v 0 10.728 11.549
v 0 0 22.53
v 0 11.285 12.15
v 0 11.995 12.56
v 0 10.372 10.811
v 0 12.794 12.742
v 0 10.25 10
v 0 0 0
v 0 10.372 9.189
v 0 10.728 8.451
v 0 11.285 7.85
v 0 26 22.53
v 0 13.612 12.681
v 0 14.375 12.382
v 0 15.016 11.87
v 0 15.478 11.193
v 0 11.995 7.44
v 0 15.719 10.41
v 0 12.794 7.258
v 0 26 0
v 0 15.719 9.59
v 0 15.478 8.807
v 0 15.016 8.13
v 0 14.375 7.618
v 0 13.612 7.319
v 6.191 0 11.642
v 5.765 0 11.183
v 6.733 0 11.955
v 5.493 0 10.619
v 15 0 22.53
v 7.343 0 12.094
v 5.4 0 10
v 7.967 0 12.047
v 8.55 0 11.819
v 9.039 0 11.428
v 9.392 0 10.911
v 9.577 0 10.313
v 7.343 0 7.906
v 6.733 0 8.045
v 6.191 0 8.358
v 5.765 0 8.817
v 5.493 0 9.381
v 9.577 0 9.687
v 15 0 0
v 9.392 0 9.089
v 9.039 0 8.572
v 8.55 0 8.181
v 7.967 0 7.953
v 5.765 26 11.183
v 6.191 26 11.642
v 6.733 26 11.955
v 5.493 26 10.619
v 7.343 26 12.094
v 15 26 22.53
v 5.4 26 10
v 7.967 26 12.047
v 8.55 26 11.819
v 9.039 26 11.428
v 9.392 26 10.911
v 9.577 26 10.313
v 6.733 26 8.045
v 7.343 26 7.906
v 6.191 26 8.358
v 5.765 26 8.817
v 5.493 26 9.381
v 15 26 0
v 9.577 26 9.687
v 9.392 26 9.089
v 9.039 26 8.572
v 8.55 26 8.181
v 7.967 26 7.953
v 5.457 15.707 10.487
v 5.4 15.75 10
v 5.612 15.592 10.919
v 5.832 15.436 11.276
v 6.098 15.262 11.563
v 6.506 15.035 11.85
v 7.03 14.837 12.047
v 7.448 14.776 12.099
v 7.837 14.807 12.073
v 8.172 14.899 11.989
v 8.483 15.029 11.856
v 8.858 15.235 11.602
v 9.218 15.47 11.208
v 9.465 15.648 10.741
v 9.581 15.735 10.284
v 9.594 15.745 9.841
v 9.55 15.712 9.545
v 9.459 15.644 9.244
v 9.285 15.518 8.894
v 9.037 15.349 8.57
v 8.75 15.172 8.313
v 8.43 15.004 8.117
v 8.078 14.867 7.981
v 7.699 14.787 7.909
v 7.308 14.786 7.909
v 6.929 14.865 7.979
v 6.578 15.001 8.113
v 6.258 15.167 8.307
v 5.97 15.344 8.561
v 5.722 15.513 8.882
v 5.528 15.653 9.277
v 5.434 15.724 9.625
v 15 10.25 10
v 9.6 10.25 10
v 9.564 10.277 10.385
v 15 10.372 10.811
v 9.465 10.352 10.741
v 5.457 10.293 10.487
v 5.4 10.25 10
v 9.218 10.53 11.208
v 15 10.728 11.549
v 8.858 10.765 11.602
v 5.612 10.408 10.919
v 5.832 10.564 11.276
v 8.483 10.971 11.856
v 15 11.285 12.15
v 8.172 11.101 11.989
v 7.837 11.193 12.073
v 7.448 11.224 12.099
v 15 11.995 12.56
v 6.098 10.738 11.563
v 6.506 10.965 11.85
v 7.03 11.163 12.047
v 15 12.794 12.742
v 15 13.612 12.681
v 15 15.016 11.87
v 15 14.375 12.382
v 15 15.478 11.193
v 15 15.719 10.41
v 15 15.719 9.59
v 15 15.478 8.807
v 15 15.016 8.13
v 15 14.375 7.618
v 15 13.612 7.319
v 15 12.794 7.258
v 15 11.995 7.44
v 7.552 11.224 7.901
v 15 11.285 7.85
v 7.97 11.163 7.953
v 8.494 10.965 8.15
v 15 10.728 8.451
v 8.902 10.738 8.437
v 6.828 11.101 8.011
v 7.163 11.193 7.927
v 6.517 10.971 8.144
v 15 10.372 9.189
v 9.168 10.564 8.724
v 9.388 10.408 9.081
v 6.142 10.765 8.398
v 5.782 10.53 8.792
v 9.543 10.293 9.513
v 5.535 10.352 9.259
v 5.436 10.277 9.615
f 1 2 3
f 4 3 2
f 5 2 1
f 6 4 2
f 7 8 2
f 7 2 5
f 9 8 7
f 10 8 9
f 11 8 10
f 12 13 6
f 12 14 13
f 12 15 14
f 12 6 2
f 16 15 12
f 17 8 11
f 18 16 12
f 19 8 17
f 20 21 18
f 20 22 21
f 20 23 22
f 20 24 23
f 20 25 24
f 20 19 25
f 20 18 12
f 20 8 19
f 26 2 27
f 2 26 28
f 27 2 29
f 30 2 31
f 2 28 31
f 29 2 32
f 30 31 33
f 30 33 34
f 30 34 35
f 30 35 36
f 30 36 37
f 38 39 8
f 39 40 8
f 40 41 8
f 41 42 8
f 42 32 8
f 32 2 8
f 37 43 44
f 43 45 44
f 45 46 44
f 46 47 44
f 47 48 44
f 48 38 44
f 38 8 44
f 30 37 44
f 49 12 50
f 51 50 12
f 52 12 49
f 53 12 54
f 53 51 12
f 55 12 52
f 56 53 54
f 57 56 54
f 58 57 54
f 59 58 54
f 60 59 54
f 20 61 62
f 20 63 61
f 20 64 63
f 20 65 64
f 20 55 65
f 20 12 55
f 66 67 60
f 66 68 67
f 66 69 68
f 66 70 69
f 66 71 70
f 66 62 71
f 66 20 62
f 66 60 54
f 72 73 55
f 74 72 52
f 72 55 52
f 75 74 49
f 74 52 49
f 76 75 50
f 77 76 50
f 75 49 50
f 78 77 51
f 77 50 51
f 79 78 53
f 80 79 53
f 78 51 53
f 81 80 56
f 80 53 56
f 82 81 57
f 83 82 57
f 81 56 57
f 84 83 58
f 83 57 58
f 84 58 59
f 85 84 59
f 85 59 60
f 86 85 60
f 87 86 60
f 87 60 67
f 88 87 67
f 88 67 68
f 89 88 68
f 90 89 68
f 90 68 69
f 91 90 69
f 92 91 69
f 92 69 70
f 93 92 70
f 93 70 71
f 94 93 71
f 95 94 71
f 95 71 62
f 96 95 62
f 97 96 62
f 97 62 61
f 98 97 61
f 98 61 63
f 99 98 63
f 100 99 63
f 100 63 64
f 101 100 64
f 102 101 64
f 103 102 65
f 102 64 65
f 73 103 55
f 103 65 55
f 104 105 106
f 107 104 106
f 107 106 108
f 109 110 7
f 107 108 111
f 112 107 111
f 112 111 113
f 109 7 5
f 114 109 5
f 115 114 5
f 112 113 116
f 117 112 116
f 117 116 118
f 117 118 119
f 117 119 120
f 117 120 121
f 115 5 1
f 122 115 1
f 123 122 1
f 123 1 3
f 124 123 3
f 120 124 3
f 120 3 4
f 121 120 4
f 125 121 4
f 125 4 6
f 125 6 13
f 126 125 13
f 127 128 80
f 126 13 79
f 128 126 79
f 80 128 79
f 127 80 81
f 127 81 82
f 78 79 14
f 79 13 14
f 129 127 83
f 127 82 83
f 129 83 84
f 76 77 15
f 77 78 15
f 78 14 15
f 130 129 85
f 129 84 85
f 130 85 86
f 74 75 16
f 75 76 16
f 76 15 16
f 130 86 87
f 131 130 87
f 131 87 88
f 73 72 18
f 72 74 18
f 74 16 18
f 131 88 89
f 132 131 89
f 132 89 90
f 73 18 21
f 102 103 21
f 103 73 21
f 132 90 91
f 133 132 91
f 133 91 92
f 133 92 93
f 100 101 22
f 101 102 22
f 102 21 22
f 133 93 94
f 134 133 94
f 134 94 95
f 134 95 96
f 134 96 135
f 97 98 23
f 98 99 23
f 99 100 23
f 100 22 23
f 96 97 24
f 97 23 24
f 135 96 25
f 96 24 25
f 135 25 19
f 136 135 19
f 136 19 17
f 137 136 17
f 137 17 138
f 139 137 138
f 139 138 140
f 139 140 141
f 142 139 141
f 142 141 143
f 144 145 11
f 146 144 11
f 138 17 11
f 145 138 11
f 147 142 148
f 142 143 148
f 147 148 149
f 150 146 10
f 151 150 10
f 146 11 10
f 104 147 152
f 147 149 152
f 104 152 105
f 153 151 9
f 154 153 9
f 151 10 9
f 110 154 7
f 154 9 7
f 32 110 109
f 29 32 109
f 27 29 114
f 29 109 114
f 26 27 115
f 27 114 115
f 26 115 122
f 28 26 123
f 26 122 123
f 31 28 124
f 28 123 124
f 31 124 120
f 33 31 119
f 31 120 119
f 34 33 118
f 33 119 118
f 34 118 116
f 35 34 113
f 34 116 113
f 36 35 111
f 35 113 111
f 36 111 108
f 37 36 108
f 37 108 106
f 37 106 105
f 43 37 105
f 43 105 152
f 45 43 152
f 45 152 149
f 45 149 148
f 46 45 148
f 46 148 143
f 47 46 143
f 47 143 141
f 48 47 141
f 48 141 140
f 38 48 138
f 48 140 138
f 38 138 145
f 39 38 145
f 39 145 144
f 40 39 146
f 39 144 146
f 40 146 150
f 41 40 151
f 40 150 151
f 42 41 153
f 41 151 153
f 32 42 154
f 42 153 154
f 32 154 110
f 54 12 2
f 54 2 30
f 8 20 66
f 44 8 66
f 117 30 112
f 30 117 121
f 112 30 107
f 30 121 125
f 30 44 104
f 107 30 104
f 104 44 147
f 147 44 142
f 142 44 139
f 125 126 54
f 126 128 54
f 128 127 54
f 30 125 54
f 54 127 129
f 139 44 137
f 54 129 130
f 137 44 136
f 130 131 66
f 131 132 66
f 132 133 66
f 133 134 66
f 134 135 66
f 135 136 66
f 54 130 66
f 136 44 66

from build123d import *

# Parameters (mm, degrees)
F0_W     = 15
F0_H     = 26
F1_DEPTH = 22.5298
F3_D     = 4.2
F5_D     = 5.5


with BuildPart() as f1:
    # F0 (on Top) → F1 (new body)
    with BuildSketch(Plane.XY):
        with Locations((7.5, 13)):
            Rectangle(F0_W, F0_H)
    extrude(amount=F1_DEPTH)

    # F3 (through all)
    with Locations(Plane.XZ):
        with Locations((7.5, 10)):
            Hole(F3_D / 2)

    # F5 (through all)
    with Locations(Plane.YZ.offset(15)):
        with Locations((13, 10)):
            Hole(F5_D / 2)


solid = f1.part
